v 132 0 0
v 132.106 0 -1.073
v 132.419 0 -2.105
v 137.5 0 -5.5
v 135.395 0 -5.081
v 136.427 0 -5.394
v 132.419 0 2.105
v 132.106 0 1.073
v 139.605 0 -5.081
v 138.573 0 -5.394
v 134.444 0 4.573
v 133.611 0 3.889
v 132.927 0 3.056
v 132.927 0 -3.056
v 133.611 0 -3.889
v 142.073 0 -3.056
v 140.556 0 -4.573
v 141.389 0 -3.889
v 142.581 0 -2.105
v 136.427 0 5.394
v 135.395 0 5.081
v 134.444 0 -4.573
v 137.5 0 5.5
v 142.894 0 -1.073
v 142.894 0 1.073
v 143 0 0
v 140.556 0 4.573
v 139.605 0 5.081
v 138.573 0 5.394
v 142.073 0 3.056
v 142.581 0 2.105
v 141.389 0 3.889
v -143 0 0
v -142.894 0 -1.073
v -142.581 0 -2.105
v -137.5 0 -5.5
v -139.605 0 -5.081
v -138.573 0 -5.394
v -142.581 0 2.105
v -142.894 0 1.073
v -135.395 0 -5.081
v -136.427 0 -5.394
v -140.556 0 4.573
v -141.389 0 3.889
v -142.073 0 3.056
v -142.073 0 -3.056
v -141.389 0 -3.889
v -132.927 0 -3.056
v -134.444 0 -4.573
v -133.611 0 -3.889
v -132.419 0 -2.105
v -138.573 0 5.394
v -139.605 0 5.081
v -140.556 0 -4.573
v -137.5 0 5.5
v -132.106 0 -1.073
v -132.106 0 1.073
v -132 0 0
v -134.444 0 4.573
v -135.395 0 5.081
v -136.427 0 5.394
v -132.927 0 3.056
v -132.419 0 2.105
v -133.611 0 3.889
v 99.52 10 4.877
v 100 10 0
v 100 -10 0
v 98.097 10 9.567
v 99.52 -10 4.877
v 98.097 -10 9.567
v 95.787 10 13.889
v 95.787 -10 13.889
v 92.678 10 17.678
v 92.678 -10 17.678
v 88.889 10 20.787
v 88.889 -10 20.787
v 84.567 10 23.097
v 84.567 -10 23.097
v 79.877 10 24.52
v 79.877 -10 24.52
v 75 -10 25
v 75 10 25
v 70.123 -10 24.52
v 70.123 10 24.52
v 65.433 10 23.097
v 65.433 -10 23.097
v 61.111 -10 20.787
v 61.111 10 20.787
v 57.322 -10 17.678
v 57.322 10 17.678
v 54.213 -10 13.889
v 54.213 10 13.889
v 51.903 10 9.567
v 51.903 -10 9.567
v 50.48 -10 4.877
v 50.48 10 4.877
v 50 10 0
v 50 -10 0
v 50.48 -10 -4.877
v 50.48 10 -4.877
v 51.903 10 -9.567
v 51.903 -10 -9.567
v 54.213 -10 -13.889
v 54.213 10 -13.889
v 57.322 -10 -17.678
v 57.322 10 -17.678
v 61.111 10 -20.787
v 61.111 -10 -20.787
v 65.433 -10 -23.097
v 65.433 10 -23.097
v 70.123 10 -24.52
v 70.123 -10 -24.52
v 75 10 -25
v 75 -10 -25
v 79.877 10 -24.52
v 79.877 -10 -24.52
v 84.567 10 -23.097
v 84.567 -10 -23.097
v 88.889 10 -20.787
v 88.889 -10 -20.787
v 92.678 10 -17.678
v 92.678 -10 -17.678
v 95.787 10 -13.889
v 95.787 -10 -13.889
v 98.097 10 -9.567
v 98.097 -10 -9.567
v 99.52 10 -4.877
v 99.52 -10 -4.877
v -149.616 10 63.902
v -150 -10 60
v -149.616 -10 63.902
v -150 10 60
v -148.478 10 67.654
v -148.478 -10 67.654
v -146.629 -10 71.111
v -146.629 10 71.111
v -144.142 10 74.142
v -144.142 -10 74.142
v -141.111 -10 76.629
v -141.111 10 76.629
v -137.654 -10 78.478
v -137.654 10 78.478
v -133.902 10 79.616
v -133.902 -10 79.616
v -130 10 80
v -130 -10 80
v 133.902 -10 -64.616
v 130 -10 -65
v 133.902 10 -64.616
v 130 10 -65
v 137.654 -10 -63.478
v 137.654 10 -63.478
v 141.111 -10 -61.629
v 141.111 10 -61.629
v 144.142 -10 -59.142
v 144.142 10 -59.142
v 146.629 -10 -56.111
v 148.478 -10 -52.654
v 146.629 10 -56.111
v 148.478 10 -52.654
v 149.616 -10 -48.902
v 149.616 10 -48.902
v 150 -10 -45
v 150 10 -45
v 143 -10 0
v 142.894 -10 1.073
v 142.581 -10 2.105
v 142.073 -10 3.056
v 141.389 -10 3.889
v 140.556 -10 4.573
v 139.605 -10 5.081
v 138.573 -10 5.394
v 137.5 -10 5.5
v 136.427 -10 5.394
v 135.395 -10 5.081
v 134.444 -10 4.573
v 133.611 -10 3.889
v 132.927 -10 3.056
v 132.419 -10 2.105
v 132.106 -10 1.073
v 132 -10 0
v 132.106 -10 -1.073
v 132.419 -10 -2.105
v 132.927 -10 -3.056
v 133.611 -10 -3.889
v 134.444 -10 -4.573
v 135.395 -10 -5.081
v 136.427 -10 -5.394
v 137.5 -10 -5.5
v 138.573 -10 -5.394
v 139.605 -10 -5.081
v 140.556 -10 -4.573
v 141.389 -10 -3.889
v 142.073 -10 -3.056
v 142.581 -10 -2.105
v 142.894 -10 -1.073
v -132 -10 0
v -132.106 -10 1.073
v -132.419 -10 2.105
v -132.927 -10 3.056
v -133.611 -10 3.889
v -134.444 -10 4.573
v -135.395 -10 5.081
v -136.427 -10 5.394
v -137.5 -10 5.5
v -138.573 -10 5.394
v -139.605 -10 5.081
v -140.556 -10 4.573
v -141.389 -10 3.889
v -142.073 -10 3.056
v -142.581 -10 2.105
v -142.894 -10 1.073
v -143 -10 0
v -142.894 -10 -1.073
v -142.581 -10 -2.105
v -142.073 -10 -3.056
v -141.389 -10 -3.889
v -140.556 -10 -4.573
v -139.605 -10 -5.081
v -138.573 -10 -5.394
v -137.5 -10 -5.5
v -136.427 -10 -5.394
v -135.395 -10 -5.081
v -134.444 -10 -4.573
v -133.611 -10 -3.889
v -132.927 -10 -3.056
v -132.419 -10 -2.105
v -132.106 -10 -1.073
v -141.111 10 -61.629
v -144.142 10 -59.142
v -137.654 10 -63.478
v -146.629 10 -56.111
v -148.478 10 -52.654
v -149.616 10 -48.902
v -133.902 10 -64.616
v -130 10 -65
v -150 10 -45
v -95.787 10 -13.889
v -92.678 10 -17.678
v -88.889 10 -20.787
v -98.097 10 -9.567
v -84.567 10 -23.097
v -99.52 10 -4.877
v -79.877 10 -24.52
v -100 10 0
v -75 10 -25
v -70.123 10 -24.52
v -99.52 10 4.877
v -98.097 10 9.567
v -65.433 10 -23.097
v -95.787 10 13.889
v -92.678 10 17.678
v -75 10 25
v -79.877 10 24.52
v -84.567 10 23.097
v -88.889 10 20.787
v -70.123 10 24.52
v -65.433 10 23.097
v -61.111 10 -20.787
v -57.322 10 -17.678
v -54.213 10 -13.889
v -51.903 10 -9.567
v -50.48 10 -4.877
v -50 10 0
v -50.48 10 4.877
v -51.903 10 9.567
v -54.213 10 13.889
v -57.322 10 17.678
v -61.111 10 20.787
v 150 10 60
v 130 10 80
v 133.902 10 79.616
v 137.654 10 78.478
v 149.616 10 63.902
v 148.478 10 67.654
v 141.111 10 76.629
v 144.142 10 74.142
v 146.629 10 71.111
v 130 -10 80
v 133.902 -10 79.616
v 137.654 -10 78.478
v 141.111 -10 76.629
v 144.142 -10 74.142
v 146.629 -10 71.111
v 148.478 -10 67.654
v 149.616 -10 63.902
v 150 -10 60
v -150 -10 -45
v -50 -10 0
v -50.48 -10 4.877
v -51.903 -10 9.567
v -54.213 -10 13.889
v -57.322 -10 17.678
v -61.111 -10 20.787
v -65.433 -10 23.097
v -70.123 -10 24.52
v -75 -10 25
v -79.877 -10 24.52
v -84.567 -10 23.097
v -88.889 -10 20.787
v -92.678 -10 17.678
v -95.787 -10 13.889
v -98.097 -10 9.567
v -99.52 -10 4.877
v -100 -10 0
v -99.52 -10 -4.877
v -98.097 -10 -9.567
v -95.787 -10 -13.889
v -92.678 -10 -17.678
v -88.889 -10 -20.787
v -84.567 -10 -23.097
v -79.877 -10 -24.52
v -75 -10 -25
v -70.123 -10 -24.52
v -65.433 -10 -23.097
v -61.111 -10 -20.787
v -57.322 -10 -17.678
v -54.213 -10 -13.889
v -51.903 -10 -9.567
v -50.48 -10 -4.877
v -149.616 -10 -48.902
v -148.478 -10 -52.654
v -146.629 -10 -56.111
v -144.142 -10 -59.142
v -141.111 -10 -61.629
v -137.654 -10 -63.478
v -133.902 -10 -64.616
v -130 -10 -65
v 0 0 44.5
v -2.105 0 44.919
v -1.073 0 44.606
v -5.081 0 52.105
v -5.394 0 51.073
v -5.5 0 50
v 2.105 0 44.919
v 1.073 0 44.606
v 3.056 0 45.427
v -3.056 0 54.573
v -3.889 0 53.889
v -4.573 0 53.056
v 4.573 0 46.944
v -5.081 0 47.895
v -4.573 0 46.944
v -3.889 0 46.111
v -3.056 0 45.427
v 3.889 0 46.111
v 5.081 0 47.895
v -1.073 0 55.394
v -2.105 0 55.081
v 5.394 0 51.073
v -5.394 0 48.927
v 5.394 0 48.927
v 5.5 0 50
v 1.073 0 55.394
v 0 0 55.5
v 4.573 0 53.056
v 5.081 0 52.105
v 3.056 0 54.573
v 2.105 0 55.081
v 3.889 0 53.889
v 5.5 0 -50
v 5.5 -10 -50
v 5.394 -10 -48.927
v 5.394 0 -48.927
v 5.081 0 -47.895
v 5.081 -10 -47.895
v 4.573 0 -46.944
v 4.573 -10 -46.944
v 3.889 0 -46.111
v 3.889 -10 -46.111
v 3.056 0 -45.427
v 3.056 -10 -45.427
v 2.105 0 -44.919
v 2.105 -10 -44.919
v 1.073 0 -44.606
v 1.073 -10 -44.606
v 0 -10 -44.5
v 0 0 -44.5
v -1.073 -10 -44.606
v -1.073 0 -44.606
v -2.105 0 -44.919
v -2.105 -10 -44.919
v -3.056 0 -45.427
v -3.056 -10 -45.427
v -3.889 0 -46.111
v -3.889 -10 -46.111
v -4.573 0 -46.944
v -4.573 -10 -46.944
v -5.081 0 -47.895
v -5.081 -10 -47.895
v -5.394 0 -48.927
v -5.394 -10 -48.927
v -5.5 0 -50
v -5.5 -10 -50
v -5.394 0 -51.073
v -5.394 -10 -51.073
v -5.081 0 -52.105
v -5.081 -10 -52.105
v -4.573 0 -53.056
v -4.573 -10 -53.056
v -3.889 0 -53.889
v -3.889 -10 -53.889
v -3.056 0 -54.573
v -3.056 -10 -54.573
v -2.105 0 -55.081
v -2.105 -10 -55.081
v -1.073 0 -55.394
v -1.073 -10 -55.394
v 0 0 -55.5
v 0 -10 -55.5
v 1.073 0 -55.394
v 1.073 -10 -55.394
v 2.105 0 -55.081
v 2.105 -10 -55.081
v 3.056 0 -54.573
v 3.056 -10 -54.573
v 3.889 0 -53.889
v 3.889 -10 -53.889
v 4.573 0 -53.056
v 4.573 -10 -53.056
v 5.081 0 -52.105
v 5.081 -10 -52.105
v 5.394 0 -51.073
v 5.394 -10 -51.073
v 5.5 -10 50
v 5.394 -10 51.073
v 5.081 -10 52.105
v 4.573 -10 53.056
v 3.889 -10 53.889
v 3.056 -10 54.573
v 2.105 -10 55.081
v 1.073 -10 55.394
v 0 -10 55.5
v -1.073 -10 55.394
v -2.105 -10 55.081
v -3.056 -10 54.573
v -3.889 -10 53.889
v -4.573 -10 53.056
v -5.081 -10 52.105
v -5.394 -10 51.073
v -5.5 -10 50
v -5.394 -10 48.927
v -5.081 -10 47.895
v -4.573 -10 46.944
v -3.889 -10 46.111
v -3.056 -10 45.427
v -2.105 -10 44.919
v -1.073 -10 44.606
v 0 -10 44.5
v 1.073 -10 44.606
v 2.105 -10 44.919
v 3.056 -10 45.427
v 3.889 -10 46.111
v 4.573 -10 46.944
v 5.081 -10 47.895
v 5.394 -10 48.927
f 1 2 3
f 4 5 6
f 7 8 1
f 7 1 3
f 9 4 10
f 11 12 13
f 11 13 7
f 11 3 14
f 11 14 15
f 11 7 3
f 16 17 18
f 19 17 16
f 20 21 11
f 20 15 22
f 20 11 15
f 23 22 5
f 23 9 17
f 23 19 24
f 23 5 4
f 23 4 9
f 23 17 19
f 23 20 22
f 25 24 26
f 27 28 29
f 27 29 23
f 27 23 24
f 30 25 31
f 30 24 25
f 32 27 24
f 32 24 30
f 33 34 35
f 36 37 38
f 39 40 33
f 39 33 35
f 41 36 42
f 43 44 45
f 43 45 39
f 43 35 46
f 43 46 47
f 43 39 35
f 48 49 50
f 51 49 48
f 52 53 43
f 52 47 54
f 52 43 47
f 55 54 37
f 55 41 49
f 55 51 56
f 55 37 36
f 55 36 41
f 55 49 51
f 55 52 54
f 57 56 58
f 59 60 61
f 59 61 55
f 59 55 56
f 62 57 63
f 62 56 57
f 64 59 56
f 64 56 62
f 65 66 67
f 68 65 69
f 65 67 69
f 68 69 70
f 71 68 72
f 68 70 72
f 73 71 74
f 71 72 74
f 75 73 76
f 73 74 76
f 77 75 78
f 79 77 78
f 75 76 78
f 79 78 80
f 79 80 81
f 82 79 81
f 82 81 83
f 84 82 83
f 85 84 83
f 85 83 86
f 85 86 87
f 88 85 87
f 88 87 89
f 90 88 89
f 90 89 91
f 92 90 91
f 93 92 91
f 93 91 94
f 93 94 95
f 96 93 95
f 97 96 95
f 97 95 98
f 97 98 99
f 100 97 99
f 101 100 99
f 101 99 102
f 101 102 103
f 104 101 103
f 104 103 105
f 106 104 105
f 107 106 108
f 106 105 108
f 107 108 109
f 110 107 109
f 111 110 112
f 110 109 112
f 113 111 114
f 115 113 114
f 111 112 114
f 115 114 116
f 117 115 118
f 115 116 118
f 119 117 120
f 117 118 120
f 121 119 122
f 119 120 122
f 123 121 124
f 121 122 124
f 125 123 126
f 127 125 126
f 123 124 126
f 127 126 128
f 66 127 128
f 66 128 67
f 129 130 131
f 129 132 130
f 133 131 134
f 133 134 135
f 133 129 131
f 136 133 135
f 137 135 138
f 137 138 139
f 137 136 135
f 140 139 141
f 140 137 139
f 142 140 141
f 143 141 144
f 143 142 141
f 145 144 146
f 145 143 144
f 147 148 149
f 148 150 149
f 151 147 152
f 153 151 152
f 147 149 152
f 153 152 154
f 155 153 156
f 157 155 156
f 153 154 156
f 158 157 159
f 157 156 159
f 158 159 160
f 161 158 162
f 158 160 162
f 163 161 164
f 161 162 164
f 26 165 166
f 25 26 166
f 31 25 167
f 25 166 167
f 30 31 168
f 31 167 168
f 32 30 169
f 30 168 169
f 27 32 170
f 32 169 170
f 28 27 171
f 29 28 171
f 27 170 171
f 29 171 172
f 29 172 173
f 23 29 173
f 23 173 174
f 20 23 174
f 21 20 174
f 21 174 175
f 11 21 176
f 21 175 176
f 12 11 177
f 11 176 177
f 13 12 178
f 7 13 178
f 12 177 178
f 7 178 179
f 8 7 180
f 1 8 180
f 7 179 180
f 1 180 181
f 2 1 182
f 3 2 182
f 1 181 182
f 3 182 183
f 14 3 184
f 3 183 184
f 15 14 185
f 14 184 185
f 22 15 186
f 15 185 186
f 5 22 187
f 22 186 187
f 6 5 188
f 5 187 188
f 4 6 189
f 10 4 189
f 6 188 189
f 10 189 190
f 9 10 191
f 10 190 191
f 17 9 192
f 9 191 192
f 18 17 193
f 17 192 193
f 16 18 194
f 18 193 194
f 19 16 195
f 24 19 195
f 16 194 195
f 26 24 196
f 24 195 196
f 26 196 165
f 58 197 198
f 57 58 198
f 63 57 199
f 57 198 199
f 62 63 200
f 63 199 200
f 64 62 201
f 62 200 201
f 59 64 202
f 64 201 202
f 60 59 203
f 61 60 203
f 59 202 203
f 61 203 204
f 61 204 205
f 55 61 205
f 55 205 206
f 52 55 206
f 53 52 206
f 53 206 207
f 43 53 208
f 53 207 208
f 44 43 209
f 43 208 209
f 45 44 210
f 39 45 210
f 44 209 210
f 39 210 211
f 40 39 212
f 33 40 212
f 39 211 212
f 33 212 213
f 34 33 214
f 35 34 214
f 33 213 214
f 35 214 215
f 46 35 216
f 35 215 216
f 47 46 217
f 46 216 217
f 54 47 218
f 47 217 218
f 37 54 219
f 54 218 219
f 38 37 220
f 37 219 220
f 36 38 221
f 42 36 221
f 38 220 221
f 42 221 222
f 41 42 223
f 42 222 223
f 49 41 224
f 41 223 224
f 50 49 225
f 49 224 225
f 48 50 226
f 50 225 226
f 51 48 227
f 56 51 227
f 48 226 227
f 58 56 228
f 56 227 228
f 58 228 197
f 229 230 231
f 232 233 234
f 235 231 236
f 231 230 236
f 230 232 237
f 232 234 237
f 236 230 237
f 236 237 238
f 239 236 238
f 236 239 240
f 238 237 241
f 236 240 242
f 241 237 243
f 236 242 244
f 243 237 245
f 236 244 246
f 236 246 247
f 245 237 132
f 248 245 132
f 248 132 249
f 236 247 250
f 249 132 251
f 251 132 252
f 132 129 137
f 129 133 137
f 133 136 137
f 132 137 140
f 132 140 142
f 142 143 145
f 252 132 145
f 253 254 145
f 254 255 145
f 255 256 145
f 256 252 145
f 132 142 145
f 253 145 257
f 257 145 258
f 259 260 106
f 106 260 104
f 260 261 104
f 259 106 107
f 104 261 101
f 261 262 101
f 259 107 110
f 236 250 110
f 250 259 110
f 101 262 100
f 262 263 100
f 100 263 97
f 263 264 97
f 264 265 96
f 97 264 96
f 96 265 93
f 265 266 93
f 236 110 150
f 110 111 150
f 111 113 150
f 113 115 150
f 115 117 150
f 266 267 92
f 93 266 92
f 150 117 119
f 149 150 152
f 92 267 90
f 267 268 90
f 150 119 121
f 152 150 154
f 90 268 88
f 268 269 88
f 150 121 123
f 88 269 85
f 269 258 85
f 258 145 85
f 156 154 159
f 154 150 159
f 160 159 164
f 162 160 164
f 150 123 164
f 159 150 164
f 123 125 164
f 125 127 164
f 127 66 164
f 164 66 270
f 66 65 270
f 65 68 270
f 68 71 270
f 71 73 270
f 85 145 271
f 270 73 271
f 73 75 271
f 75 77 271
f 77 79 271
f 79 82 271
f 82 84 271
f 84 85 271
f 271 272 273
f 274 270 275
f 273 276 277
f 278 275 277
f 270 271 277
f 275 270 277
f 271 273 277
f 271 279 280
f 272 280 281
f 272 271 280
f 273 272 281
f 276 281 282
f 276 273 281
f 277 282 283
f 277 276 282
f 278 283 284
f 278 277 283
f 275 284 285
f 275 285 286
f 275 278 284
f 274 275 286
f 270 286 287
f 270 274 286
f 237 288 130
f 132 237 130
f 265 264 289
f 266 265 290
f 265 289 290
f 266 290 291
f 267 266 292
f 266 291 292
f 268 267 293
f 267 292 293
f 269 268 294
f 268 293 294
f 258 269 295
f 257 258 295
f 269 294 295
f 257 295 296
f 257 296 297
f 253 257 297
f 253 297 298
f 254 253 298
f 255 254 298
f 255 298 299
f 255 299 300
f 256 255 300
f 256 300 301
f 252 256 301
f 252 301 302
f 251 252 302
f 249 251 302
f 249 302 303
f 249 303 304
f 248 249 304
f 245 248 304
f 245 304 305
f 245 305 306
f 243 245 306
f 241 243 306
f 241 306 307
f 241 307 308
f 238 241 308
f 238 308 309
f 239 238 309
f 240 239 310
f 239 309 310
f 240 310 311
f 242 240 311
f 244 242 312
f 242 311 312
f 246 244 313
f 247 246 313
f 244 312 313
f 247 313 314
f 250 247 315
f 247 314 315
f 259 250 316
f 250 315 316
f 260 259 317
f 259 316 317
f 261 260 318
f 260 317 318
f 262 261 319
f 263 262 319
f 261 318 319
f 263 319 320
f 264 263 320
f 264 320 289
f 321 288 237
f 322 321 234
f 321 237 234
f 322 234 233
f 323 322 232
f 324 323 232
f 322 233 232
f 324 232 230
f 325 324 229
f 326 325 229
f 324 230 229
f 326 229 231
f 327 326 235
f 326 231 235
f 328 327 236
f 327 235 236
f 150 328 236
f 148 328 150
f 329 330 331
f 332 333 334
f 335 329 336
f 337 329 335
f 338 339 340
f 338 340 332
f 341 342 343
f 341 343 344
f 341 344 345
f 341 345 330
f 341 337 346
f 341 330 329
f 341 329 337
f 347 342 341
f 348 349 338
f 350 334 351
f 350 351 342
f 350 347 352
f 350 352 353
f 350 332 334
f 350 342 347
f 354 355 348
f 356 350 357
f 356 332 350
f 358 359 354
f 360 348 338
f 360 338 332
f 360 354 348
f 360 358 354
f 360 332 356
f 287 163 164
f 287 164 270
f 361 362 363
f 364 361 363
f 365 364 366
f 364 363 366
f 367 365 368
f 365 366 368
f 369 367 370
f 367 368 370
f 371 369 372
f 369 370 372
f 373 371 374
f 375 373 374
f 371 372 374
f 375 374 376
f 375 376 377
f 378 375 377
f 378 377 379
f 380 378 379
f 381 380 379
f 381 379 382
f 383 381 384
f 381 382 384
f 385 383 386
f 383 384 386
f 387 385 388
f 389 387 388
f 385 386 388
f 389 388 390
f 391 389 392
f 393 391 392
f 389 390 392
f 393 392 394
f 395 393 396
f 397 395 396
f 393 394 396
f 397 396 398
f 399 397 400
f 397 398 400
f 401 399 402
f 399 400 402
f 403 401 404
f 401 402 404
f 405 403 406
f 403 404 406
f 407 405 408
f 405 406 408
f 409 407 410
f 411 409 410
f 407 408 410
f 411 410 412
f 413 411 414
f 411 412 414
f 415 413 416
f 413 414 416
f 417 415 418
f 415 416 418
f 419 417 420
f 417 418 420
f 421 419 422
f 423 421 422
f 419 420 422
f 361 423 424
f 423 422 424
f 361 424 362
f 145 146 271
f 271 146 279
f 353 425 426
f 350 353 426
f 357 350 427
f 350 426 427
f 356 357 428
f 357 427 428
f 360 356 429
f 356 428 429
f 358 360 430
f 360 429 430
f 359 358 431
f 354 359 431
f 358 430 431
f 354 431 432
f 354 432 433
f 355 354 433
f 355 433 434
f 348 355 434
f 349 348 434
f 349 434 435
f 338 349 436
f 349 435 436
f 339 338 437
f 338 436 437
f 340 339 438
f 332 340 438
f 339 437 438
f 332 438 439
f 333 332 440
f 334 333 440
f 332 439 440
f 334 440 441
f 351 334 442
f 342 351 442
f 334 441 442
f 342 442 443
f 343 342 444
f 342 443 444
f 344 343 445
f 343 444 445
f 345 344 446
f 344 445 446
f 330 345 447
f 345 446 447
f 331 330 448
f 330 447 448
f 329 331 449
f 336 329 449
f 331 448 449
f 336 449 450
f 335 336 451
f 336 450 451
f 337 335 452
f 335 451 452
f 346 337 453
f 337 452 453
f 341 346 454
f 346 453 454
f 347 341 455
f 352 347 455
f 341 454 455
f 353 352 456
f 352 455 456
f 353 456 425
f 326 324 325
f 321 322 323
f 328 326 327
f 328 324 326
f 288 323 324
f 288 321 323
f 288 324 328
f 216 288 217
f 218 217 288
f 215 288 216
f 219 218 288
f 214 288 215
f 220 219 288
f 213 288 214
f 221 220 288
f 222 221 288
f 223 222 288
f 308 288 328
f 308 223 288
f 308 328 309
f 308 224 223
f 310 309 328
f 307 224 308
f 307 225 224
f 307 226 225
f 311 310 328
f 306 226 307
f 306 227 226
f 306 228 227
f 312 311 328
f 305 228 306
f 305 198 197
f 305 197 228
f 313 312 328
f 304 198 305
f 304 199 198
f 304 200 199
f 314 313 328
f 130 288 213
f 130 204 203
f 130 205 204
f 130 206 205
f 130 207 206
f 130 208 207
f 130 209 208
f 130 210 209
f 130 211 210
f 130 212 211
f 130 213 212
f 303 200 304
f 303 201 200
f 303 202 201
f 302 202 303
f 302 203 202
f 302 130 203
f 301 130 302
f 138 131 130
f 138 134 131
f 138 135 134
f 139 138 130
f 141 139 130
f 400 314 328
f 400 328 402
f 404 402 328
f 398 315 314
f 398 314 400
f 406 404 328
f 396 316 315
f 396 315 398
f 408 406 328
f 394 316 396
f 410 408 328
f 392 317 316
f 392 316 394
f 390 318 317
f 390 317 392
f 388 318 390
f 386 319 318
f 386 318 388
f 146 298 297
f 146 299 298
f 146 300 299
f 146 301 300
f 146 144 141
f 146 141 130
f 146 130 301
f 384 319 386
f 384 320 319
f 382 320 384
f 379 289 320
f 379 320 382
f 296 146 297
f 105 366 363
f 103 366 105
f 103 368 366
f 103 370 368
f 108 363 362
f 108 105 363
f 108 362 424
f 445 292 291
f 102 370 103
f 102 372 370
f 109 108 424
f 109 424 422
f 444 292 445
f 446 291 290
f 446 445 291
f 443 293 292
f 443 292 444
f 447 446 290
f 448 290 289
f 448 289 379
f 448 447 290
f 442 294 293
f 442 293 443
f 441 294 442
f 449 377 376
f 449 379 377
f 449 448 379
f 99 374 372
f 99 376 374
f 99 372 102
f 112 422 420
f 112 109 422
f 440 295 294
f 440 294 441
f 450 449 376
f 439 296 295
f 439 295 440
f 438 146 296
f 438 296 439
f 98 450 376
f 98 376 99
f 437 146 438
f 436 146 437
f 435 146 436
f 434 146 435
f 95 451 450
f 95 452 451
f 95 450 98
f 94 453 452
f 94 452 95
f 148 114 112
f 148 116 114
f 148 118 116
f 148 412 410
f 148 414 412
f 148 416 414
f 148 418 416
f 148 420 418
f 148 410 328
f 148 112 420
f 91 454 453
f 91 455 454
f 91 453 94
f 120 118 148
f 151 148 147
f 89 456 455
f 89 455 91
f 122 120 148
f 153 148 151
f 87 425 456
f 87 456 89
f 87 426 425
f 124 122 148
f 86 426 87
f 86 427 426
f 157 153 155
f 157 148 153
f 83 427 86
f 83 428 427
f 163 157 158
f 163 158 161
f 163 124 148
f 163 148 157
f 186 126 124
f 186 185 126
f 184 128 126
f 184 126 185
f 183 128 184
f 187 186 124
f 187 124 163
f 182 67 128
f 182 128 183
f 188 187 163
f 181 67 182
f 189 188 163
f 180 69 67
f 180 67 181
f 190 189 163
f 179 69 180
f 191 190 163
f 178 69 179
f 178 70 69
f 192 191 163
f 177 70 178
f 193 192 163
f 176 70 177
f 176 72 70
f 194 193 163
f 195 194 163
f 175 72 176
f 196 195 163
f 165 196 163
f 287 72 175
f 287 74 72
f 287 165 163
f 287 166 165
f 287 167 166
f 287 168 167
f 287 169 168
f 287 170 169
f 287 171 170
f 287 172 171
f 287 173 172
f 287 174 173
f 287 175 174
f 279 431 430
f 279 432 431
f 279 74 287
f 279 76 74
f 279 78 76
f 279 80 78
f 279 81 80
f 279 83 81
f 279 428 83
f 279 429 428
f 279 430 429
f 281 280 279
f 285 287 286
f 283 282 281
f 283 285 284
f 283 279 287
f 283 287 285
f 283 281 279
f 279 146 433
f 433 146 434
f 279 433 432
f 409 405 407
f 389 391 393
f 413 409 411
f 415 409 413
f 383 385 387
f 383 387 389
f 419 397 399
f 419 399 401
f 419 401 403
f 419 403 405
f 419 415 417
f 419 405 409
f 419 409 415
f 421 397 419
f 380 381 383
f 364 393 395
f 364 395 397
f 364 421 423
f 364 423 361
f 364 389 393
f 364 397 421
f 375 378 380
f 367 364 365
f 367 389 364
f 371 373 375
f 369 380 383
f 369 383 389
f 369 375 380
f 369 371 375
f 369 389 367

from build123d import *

# Parameters (mm, degrees)
F0_W     = 300
F0_H     = 160
F1_DEPTH = 10
F2_R     = 25
F3_DEPTH = 20.001
F4_R     = 5.5
F5_DEPTH = 10
F6_W     = 300
F6_H     = 15
F7_DEPTH = 20.001
F8_R     = 20


with BuildPart() as f1:
    # F0 (on Front) → F1 (new body, symmetric)
    with BuildSketch(Plane.XZ):
        Rectangle(F0_W, F0_H)
    extrude(amount=F1_DEPTH, both=True)

    # F2 (on face) → F3 (cut, through all)
    with BuildSketch(Plane.XZ.offset(10)):
        with Locations((-75, 0)):
            Circle(F2_R)
        with Locations((75, 0)):
            Circle(F2_R)
    extrude(amount=-F3_DEPTH, mode=Mode.SUBTRACT)

    # F4 (on face) → F5 (cut)
    with BuildSketch(Plane.XZ.offset(10)):
        with Locations((-137.5, 0)):
            Circle(F4_R)
        with Locations((0, 50)):
            Circle(F4_R)
        with Locations((137.5, 0)):
            Circle(F4_R)
        with Locations((0, -50)):
            Circle(F4_R)
    extrude(amount=-F5_DEPTH, mode=Mode.SUBTRACT)

    # F6 (on face) → F7 (cut, through all)
    with BuildSketch(Plane.XZ.offset(10)):
        with Locations((0, -72.5)):
            Rectangle(F6_W, F6_H)
    extrude(amount=-F7_DEPTH, mode=Mode.SUBTRACT)

    # F8
    f8_edges = [f1.edges().sort_by_distance(p)[0] for p in [
        (-150, 0, 80),
        (150, 0, 80),
        (-150, 0, -65),
        (150, 0, -65),
    ]]
    fillet(f8_edges, radius=F8_R)


solid = f1.part
